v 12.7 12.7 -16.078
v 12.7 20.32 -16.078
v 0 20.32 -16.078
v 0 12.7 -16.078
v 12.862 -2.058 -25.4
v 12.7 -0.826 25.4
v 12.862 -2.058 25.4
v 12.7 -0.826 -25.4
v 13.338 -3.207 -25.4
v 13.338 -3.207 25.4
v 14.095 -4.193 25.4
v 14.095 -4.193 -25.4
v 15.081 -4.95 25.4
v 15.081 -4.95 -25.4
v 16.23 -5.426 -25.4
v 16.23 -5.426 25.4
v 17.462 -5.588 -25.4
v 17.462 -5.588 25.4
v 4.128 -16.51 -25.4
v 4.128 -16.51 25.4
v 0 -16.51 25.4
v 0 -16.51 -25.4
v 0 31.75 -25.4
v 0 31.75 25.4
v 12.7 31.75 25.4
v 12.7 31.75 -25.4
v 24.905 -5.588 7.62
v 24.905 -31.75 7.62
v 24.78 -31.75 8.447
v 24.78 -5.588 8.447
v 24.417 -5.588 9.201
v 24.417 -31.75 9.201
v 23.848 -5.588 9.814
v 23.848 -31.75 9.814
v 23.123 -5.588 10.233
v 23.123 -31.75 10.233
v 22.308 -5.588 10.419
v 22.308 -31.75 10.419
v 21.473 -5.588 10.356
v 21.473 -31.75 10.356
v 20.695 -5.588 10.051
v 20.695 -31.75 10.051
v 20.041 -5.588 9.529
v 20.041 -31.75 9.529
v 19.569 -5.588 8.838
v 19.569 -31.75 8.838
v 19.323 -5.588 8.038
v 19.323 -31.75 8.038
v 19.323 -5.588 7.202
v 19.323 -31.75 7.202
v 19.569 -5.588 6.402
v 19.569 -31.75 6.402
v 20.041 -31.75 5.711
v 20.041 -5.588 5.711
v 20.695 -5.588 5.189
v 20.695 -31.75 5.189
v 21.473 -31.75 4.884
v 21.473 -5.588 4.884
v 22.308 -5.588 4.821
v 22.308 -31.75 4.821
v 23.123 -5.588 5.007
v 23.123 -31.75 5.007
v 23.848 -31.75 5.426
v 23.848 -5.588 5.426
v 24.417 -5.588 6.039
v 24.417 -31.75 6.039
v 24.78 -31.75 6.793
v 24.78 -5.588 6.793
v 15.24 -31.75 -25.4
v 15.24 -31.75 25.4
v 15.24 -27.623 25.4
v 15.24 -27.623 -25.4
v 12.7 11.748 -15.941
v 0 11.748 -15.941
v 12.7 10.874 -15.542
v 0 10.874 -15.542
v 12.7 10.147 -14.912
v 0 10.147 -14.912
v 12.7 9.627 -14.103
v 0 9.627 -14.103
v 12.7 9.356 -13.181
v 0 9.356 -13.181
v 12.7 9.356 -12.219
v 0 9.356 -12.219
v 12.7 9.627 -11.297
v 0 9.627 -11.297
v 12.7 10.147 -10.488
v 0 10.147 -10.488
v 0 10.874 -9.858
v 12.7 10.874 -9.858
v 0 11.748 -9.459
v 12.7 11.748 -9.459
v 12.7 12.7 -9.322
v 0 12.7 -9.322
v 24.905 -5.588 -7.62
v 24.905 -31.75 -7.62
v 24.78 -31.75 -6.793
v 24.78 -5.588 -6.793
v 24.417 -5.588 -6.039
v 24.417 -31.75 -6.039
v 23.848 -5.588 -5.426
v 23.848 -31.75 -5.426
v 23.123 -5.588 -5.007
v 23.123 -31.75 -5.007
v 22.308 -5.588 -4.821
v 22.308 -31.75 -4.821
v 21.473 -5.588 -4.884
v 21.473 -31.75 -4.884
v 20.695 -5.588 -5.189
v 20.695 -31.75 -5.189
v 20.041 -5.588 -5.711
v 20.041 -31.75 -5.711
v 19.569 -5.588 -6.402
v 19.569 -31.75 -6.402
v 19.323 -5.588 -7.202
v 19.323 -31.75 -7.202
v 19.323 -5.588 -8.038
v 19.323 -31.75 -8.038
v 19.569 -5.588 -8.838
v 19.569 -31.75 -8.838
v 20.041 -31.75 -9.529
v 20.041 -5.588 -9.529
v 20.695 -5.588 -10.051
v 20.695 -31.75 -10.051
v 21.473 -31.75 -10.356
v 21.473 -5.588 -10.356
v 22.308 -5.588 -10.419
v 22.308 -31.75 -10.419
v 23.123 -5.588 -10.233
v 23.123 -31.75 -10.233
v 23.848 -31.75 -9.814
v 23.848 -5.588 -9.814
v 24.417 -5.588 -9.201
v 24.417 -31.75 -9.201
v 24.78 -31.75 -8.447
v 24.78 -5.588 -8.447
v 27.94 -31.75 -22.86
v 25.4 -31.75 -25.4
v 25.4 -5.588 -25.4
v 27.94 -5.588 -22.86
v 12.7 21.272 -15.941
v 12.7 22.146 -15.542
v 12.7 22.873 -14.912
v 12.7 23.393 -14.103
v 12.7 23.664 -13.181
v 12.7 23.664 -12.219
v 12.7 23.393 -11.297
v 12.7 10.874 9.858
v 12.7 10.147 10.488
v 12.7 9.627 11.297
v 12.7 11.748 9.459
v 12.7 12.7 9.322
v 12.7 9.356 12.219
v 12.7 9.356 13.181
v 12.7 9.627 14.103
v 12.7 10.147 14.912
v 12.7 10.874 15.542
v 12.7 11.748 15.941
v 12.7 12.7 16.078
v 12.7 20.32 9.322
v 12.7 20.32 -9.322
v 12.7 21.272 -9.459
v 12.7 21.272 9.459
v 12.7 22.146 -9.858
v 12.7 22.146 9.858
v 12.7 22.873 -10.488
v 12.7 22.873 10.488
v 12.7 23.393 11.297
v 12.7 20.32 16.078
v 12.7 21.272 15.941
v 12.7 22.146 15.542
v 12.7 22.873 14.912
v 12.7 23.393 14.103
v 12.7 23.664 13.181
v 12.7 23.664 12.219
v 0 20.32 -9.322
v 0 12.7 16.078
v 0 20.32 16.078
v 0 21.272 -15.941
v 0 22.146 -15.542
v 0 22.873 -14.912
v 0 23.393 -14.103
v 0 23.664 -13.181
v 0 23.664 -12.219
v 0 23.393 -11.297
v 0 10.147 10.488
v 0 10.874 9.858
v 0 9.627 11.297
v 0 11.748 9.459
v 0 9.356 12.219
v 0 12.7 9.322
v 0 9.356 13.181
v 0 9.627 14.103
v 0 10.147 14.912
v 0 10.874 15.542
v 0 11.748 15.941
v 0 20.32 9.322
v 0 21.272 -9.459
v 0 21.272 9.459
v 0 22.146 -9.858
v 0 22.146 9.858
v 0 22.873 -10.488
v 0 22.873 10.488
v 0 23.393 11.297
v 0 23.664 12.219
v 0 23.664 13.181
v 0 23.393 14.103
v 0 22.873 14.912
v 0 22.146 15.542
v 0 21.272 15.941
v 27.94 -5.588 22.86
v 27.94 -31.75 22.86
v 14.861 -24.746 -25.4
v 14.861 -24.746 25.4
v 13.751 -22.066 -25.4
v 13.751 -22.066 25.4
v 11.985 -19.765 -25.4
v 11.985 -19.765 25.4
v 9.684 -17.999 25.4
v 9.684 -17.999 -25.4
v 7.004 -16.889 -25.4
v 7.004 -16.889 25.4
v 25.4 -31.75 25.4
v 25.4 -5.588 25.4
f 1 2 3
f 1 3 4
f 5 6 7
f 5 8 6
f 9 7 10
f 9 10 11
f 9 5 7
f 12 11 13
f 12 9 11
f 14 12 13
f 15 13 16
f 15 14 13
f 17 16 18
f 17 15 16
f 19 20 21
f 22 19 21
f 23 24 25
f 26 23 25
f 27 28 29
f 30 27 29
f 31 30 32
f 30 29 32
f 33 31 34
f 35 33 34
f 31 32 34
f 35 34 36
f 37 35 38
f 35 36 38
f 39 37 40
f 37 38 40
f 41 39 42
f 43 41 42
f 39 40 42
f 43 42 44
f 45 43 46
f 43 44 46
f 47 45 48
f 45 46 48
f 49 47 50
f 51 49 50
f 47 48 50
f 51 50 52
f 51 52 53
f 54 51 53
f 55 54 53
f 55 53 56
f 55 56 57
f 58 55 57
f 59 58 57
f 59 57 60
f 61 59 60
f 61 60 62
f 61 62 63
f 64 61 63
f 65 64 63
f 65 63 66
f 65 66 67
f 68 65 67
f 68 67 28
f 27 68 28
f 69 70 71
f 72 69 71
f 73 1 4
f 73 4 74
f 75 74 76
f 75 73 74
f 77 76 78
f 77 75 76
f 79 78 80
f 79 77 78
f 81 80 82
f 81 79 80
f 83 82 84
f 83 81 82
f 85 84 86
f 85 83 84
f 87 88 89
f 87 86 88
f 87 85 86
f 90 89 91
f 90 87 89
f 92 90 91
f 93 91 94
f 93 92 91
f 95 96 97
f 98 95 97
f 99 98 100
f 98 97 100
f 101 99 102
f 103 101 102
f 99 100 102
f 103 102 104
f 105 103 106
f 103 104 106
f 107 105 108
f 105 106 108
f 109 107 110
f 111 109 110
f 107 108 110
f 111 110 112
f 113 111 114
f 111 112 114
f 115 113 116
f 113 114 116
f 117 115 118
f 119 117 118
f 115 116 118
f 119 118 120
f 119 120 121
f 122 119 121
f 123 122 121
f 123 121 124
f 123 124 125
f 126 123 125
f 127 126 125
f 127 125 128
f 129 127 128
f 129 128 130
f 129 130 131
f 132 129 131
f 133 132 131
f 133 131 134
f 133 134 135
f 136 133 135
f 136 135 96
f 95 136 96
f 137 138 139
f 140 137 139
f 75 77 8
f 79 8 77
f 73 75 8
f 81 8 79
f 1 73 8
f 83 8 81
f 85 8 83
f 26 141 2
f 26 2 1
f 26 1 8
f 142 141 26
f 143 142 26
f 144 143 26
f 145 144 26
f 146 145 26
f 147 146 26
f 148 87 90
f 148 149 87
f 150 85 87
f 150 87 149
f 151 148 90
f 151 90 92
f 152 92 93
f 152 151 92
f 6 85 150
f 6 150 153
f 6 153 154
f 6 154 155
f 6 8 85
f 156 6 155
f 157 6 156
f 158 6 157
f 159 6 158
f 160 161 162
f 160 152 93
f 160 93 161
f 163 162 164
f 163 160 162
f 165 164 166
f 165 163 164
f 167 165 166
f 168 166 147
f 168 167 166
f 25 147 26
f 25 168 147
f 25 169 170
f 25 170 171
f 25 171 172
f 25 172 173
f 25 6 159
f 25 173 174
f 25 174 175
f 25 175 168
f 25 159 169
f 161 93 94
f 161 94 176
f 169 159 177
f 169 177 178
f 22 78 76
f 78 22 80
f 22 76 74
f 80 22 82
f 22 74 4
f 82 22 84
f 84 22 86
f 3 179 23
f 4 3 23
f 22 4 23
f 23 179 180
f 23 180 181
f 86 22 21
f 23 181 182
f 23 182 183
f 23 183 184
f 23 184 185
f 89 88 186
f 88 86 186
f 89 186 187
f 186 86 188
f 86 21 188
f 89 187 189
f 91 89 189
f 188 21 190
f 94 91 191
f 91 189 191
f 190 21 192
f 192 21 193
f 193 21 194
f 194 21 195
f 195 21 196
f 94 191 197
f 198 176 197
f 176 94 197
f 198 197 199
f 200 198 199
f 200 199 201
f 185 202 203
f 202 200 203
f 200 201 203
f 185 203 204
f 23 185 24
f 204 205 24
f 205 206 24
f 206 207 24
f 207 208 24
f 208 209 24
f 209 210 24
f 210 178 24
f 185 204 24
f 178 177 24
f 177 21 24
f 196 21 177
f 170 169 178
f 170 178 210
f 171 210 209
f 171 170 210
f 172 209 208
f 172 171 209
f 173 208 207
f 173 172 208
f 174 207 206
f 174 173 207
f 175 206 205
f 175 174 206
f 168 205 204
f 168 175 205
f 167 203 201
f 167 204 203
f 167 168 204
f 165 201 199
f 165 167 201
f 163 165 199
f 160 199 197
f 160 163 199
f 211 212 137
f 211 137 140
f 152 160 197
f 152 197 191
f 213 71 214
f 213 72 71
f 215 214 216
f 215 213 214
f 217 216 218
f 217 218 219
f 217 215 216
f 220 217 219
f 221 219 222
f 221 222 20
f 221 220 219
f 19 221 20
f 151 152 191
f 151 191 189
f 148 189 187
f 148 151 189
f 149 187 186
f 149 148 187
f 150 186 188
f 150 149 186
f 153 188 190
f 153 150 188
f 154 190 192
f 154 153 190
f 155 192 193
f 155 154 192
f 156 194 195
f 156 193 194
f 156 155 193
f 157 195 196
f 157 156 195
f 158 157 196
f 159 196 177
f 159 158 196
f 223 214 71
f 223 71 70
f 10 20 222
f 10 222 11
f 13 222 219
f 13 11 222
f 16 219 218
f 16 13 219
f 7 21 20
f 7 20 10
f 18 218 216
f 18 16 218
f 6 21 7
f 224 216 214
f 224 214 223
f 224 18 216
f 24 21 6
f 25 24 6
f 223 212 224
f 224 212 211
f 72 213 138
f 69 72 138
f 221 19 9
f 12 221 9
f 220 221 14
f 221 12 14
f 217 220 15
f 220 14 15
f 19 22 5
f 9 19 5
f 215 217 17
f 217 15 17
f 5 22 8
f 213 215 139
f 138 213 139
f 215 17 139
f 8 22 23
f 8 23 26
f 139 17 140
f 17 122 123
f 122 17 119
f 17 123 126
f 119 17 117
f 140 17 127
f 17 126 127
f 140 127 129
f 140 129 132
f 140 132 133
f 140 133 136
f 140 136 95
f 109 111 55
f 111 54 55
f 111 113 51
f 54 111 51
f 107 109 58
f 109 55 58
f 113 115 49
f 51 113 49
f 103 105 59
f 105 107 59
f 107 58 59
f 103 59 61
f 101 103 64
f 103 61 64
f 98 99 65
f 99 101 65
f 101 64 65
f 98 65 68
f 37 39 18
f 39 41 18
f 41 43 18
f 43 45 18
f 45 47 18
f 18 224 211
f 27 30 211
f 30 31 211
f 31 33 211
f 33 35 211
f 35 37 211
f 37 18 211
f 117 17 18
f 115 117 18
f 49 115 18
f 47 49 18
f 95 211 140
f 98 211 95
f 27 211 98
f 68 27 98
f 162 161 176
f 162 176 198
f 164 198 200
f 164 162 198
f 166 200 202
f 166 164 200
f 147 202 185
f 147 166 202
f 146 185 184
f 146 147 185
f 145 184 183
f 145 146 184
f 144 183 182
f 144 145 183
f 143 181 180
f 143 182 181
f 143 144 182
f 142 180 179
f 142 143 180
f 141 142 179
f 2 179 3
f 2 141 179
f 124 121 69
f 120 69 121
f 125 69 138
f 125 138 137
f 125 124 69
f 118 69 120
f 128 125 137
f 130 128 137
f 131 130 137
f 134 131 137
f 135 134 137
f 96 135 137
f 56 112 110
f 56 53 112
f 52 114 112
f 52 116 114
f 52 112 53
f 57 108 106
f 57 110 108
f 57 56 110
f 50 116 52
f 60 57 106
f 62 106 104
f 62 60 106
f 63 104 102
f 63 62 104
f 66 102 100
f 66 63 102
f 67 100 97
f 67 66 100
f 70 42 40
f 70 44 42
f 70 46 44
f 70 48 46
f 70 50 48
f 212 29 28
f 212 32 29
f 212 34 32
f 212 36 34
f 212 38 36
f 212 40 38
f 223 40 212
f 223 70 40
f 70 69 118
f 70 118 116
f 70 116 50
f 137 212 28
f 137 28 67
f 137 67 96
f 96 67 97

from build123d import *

# Parameters (mm, degrees)
SKETCH1_W              = 55.88
SKETCH1_H              = 63.5
EXTRUDE1_DEPTH         = 25.4
EXTRUDE1_DEPTH_BACK    = 25.4
EXTRUDE2_DEPTH         = 51.8
FILLET1_R              = 11.1125
F_10_CLEARANCE_HOLE1_D = 5.6134
LPATTERN1_COUNT        = 2
LPATTERN1_PITCH        = 15.24
SKETCH9_W              = 15.24
SKETCH9_H              = 37.338
EXTRUDE3_DEPTH         = 51.8
FILLET2_R              = 4.7625
EXTRUDE5_DEPTH         = 13.7
LPATTERN2_COUNT        = 2
LPATTERN2_PITCH        = 25.4
CHAMFER1_SIZE          = 2.54


with BuildPart() as part:
    # Sketch1 → Extrude1 (new body, two sides)
    with BuildSketch(Plane.XY) as extrude1_sk:
        Rectangle(SKETCH1_W, SKETCH1_H)
    extrude(amount=EXTRUDE1_DEPTH)
    extrude(extrude1_sk.sketch, amount=-EXTRUDE1_DEPTH_BACK)

    # Sketch2 → Extrude2 (cut, through all)
    with BuildSketch(Plane.XY.offset(25.4)):
        Polygon((-27.94, -31.75), (15.24, -31.75), (15.24, -16.51), (0, -16.51), (0, 31.75), (-27.94, 31.75), align=None)
    extrude(amount=-EXTRUDE2_DEPTH, mode=Mode.SUBTRACT)

    # Fillet1
    fillet1_edges = [part.edges().sort_by_distance(p)[0] for p in [
        (15.24, -16.51, 0),
    ]]
    fillet(fillet1_edges, radius=FILLET1_R)

    # 10 Clearance Hole1 (through all)
    with Locations(Plane(origin=(0, 31.75, 0), x_dir=(-1, 0, 0), z_dir=(0, 1, 0))):
        with Locations((-22.098, -7.62)):
            f_10_clearance_hole1 = Hole(F_10_CLEARANCE_HOLE1_D / 2)

    # LPattern1: 10 Clearance Hole1 ×2
    with Locations(*[(0, 0, i * LPATTERN1_PITCH) for i in range(1, LPATTERN1_COUNT)]):
        add(f_10_clearance_hole1, mode=Mode.SUBTRACT)

    # Sketch9 → Extrude3 (cut, through all)
    with BuildSketch(Plane.XY.offset(25.4)):
        with Locations((20.32, 13.081)):
            Rectangle(SKETCH9_W, SKETCH9_H)
    extrude(amount=-EXTRUDE3_DEPTH, mode=Mode.SUBTRACT)

    # Fillet2
    fillet2_edges = [part.edges().sort_by_distance(p)[0] for p in [
        (12.7, -5.588, 0),
    ]]
    fillet(fillet2_edges, radius=FILLET2_R)

    # Sketch11 → Extrude5 (cut, through all)
    with BuildSketch(Plane(origin=(12.7, 0, 0), x_dir=(0, 0, -1), z_dir=(1, 0, 0))):
        with BuildLine():
            Line((-9.3218, 20.32), (-9.3218, 12.7))
            ThreePointArc((-9.3218, 12.7), (-12.7, 9.3218), (-16.0782, 12.7))
            Line((-16.0782, 12.7), (-16.0782, 20.32))
            ThreePointArc((-16.0782, 20.32), (-12.7, 23.6982), (-9.3218, 20.32))
        make_face()
    extrude5 = extrude(amount=-EXTRUDE5_DEPTH, mode=Mode.SUBTRACT)

    # LPattern2: Extrude5 ×2
    with Locations(*[(0, 0, -i * LPATTERN2_PITCH) for i in range(1, LPATTERN2_COUNT)]):
        add(extrude5, mode=Mode.SUBTRACT)

    # Chamfer1
    chamfer1_edges = [part.edges().sort_by_distance(p)[0] for p in [
        (27.94, -18.669, -25.4),
        (27.94, -18.669, 25.4),
    ]]
    chamfer(chamfer1_edges, length=CHAMFER1_SIZE)


solid = part.part
